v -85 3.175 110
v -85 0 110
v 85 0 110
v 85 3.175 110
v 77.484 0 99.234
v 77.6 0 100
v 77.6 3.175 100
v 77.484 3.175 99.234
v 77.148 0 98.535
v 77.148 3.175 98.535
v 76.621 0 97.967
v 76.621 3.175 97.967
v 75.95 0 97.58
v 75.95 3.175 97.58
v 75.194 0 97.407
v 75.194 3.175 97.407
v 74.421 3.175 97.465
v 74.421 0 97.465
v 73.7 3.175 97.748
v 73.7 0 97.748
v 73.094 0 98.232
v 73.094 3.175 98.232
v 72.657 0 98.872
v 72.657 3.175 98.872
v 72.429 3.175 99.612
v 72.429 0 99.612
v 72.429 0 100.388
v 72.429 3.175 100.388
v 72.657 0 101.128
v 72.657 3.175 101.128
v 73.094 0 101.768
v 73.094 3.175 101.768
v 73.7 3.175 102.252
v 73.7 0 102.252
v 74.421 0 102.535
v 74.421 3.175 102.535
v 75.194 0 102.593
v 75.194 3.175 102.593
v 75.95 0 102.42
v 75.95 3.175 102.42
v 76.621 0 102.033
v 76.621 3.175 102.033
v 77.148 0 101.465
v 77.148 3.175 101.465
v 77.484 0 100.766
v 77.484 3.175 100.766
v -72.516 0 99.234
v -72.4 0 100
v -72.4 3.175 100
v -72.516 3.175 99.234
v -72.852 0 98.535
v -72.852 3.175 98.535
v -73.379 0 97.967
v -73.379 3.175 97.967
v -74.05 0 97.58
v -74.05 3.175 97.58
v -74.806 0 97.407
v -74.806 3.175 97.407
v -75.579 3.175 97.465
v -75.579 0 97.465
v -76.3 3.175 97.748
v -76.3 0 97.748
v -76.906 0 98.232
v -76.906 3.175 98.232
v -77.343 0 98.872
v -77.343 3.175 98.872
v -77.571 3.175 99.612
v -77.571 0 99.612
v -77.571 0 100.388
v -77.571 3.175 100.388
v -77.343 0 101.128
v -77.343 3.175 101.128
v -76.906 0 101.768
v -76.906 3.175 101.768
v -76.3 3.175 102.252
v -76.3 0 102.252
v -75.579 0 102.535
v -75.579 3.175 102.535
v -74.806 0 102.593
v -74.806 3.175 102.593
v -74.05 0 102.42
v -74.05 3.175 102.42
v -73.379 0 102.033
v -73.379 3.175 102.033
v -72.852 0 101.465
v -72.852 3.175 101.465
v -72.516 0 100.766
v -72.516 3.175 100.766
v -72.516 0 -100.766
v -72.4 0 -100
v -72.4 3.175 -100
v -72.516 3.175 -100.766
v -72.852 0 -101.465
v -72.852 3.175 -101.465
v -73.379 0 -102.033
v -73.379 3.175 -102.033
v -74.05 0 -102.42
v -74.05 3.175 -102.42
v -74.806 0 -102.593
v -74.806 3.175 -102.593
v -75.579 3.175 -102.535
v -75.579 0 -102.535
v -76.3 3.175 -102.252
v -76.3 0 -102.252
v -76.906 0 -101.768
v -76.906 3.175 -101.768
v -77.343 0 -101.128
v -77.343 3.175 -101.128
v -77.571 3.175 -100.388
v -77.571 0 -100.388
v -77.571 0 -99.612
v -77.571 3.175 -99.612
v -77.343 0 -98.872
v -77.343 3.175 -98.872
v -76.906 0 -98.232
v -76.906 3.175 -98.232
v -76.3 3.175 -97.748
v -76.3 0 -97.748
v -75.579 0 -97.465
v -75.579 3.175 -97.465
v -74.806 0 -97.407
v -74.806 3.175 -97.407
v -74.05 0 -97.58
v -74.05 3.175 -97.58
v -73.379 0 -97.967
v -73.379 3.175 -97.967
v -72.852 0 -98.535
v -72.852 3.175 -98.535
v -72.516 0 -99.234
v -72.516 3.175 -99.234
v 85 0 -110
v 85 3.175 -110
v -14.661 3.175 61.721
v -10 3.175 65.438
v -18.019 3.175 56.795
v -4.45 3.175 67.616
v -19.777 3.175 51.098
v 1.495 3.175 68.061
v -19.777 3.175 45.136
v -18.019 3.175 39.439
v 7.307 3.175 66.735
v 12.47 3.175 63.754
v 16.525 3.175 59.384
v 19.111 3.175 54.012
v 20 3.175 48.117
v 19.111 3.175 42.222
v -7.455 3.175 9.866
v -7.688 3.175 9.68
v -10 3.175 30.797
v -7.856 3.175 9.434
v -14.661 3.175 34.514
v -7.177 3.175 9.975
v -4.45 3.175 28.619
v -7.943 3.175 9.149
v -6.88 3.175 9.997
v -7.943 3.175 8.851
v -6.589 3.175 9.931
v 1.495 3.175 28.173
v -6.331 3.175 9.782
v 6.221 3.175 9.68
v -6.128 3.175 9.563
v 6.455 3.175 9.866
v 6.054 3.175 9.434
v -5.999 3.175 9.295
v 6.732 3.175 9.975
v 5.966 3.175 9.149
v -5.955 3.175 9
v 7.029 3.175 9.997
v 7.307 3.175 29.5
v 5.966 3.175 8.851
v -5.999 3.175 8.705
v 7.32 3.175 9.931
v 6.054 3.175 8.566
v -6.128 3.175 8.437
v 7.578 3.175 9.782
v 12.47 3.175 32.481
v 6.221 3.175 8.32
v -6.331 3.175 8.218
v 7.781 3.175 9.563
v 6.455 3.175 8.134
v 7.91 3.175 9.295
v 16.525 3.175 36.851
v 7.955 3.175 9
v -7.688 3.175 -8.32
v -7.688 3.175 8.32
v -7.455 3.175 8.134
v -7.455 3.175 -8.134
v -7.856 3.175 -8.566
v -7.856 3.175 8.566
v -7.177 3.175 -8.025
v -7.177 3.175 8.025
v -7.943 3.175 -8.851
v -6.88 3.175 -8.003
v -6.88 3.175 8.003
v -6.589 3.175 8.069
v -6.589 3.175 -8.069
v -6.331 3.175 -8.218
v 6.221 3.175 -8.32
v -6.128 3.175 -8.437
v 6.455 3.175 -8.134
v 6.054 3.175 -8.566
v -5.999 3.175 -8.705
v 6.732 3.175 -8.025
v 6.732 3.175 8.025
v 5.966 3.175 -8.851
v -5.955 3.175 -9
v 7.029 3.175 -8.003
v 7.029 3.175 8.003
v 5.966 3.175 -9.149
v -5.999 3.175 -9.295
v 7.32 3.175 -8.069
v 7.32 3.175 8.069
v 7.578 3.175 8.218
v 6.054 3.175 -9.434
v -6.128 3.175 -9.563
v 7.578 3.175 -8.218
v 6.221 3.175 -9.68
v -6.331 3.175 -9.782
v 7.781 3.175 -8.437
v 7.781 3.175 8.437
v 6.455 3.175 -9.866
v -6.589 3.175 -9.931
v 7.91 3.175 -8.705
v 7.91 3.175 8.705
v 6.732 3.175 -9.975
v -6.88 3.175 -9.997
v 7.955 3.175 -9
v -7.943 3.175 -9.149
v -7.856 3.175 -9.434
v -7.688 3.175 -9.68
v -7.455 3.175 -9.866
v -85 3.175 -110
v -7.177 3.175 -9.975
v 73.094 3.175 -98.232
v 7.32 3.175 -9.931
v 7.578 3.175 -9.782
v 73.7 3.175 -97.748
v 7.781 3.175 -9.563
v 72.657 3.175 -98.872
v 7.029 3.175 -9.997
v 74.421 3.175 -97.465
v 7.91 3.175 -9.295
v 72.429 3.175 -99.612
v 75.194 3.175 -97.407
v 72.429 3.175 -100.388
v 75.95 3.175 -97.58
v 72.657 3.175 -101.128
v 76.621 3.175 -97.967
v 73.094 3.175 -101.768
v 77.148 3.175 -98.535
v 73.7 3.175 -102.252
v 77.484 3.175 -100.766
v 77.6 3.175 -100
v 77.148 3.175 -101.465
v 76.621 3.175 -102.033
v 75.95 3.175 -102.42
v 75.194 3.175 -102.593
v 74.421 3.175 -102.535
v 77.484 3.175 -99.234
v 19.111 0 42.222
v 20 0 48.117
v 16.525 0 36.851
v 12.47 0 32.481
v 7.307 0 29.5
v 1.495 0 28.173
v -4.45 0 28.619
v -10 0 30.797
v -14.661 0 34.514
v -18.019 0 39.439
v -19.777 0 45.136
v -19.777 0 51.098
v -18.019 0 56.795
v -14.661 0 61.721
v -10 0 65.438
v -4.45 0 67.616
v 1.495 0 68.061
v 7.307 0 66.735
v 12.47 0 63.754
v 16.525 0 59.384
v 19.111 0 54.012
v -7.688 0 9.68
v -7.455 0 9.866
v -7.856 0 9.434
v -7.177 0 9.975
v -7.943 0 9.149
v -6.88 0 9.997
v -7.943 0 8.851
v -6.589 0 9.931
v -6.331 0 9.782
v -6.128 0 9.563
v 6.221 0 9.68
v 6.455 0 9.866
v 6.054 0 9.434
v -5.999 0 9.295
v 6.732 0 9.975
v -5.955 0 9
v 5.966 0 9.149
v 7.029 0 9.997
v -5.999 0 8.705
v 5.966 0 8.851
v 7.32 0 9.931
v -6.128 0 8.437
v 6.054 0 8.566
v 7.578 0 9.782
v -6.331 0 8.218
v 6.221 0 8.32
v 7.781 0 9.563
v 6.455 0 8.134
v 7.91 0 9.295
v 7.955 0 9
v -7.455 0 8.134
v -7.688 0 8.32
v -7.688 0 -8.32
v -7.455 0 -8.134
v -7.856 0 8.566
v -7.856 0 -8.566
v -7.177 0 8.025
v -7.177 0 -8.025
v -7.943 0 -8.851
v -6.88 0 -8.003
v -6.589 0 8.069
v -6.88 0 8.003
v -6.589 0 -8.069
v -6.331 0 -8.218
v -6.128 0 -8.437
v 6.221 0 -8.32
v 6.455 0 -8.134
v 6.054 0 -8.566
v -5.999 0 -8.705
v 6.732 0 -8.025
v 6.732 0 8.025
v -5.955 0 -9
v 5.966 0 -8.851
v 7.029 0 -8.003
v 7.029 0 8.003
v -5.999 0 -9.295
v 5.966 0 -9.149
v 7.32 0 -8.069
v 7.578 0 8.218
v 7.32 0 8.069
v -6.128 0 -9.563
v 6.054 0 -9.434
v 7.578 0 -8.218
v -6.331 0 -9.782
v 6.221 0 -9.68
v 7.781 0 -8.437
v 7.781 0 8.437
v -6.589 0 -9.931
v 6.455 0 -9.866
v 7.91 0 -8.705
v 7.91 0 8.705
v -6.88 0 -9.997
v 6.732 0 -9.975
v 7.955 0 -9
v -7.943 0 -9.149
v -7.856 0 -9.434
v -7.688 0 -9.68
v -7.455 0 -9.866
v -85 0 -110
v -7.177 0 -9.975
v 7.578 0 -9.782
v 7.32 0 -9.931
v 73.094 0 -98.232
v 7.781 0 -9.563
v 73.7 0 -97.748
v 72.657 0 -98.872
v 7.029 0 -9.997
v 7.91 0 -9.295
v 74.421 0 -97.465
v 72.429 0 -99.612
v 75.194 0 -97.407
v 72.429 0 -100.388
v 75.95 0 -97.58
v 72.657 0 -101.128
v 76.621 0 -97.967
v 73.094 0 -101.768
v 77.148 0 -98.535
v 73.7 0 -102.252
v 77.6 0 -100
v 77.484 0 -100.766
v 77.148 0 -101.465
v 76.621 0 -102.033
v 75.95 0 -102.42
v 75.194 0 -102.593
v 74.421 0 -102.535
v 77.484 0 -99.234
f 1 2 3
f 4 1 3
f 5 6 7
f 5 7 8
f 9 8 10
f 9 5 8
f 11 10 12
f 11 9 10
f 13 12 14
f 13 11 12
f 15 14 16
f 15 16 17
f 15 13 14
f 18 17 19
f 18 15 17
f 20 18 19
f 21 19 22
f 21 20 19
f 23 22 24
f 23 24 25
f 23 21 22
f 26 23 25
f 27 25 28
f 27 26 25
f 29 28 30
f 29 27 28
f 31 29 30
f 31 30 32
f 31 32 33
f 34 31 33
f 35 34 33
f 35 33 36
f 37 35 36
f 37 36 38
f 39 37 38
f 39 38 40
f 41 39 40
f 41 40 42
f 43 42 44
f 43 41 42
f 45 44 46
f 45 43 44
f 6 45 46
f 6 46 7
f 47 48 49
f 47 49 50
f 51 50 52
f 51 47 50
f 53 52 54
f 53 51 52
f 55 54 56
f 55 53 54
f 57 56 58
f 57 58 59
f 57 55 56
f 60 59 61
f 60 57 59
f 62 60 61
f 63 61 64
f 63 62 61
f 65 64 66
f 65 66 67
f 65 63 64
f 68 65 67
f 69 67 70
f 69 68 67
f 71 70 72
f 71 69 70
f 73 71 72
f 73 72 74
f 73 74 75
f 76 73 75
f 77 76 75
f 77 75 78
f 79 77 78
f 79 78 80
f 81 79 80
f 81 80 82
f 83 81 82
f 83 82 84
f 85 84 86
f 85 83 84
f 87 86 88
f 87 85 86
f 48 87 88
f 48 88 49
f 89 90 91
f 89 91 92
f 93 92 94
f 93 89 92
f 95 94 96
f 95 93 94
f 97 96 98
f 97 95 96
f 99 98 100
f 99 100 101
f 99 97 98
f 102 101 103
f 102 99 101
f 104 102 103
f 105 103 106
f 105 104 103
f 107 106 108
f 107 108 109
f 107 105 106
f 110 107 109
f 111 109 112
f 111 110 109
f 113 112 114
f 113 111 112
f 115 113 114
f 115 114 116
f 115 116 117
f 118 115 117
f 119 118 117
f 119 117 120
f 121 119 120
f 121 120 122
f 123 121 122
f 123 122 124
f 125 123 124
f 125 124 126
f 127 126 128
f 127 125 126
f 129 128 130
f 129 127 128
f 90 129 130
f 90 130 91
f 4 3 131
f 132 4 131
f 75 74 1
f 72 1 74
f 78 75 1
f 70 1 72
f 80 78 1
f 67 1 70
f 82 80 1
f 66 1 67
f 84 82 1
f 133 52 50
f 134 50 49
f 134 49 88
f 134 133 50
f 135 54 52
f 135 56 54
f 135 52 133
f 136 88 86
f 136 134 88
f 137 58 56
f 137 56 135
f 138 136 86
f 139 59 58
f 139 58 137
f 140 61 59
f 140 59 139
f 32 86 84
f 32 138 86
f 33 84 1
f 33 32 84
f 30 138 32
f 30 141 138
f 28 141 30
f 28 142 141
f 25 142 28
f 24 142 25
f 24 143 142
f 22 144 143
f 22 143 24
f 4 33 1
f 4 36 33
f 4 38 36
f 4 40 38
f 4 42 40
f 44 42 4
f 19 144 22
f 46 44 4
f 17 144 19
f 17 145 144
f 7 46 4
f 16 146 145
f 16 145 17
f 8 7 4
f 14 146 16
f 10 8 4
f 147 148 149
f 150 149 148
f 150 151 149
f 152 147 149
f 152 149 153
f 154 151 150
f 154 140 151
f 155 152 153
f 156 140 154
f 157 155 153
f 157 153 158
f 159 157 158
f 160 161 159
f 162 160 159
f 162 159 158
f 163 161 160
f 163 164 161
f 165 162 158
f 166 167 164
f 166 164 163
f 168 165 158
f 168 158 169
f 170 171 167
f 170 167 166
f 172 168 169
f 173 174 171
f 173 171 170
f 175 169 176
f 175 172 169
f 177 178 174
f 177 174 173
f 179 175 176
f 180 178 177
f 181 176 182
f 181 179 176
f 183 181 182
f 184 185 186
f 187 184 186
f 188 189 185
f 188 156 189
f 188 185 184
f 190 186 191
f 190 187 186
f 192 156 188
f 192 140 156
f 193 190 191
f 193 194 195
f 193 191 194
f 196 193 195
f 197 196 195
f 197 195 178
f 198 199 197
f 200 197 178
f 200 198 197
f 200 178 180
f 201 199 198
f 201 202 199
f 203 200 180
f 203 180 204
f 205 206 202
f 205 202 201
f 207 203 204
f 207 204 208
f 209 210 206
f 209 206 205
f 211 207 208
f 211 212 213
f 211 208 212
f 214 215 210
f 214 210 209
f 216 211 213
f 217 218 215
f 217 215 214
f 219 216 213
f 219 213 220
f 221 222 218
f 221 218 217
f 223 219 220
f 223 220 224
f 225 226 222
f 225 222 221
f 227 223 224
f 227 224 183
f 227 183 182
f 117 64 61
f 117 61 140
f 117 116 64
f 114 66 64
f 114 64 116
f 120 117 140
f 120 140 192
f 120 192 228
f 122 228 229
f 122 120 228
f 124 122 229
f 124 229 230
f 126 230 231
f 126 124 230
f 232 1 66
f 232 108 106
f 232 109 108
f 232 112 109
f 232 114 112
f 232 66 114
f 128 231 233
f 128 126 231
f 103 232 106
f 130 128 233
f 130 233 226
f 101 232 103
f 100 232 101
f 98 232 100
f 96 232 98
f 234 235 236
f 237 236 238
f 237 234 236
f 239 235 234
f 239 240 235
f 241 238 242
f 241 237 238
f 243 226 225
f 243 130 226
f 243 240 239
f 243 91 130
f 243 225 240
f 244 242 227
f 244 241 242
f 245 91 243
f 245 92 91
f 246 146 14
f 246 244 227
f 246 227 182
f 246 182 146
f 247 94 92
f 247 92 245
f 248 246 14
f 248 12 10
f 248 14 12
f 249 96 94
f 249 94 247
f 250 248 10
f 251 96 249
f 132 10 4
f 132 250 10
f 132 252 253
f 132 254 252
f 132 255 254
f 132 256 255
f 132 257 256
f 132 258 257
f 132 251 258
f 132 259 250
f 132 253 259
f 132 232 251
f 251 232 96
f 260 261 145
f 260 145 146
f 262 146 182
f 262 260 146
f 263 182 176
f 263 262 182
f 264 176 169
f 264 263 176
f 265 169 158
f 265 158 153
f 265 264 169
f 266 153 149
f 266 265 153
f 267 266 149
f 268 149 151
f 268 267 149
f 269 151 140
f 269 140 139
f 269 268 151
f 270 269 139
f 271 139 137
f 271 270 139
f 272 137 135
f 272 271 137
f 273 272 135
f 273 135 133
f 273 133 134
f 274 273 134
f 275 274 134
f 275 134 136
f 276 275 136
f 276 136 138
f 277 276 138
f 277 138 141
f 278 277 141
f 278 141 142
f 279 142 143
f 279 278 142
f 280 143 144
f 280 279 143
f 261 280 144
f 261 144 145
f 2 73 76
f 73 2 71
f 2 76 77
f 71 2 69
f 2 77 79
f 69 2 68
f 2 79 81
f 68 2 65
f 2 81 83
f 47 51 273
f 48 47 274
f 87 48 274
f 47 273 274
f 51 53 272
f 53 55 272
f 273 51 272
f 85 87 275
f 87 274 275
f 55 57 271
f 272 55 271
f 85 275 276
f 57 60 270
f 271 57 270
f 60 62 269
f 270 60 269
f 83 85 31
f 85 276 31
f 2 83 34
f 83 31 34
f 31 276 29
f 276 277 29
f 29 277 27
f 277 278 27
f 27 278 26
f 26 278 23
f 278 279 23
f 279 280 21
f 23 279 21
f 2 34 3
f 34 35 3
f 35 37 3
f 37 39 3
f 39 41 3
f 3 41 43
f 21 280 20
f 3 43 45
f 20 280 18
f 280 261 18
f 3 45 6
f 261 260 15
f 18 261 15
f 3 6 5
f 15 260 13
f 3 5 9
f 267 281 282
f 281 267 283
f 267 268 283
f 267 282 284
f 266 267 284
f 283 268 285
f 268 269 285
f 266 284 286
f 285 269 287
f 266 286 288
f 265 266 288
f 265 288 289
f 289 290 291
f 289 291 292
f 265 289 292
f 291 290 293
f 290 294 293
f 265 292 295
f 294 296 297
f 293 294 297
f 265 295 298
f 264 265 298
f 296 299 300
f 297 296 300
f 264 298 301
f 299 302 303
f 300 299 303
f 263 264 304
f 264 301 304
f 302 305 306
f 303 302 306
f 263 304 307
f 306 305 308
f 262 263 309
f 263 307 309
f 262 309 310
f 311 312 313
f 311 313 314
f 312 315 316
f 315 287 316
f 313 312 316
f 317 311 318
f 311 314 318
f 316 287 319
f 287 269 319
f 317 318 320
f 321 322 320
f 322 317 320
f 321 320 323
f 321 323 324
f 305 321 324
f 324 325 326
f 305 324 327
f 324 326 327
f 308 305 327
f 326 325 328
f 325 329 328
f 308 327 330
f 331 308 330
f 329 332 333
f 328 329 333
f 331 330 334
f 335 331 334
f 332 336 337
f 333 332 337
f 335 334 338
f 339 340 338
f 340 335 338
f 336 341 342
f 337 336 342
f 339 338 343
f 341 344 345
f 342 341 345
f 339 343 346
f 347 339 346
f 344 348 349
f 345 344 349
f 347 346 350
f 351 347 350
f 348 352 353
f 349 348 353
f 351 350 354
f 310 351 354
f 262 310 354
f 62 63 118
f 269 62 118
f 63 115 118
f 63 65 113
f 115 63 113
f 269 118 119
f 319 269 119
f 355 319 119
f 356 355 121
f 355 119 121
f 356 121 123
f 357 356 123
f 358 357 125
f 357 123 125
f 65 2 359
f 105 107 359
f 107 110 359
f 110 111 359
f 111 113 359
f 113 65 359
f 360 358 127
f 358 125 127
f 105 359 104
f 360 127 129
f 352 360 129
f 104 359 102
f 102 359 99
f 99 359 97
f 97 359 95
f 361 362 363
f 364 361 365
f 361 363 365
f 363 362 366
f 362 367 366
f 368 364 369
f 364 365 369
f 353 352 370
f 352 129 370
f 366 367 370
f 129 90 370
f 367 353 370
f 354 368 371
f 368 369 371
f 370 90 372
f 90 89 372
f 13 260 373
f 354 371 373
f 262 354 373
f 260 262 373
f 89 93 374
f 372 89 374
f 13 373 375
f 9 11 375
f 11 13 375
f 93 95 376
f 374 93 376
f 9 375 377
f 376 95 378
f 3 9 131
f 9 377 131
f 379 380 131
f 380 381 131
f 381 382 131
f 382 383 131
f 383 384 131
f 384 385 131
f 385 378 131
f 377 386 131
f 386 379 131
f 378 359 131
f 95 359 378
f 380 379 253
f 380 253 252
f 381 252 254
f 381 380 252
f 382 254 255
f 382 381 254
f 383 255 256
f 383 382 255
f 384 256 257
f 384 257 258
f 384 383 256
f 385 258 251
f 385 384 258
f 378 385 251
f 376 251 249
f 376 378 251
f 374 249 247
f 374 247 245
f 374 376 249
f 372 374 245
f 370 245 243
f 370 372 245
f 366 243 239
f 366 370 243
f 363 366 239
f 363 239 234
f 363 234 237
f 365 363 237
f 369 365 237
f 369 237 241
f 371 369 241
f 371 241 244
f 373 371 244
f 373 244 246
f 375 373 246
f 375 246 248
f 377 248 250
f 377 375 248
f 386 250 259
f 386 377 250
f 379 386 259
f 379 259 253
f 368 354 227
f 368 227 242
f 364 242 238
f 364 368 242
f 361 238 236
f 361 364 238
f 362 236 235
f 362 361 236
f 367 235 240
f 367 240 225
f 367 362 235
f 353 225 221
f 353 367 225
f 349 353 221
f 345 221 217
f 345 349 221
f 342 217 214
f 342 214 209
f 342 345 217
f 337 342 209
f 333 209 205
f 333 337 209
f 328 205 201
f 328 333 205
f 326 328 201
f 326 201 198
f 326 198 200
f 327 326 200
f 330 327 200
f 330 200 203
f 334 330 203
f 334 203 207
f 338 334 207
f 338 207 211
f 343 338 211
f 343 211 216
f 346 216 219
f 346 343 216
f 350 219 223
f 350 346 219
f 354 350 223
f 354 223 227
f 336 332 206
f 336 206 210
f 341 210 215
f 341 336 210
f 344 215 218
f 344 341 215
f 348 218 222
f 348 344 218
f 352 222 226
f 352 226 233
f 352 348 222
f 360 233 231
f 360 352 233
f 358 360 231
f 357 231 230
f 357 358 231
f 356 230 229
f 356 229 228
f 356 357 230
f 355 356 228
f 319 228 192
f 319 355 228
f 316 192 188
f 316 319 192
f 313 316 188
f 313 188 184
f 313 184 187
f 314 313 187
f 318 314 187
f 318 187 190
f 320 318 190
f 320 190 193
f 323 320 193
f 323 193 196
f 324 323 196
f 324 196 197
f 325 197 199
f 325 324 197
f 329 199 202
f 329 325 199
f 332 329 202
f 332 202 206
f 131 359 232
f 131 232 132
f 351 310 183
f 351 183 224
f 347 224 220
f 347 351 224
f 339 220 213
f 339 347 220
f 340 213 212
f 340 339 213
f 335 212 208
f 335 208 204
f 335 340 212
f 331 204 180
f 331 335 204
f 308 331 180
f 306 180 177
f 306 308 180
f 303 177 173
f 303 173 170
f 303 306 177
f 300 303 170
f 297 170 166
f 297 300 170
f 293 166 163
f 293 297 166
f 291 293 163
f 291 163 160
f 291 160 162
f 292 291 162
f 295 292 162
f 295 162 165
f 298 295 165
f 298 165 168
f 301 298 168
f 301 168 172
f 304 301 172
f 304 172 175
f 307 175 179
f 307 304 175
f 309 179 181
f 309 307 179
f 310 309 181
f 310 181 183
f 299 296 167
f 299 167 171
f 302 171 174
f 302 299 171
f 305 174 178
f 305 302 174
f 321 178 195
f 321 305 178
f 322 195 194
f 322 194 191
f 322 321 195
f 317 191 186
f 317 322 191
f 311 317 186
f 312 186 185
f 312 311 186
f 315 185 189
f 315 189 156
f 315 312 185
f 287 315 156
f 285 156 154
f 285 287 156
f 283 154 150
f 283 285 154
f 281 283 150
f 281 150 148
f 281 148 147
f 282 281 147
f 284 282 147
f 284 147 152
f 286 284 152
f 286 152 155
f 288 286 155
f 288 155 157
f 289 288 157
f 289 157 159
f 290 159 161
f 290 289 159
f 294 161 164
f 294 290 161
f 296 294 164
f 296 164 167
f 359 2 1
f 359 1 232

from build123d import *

# Parameters (mm, degrees)
SKETCH2_W           = 170
SKETCH2_H           = 220
SKETCH2_R           = 2.6
SKETCH2_R_2         = 1
SKETCH2_R_3         = 20
BOSS_EXTRUDE1_DEPTH = 3.175


with BuildPart() as part:
    # Sketch2 → Boss-Extrude1 (new body)
    with BuildSketch(Plane(origin=(0, 0, 0), x_dir=(1, 0, 0), z_dir=(0, 1, 0))):
        Rectangle(SKETCH2_W, SKETCH2_H)
        with Locations((-75, 100)):
            Circle(SKETCH2_R, mode=Mode.SUBTRACT)
        with Locations((75, 100)):
            Circle(SKETCH2_R, mode=Mode.SUBTRACT)
        with Locations((75, -100)):
            Circle(SKETCH2_R, mode=Mode.SUBTRACT)
        with Locations((-75, -100)):
            Circle(SKETCH2_R, mode=Mode.SUBTRACT)
        with Locations((-6.954545455, 9)):
            Circle(SKETCH2_R_2, mode=Mode.SUBTRACT)
        with Locations((6.954545455, 9)):
            Circle(SKETCH2_R_2, mode=Mode.SUBTRACT)
        with Locations((6.954545455, -9)):
            Circle(SKETCH2_R_2, mode=Mode.SUBTRACT)
        with Locations((-6.954545455, -9)):
            Circle(SKETCH2_R_2, mode=Mode.SUBTRACT)
        with Locations((0, -48.117139718)):
            Circle(SKETCH2_R_3, mode=Mode.SUBTRACT)
    extrude(amount=BOSS_EXTRUDE1_DEPTH)


solid = part.part
